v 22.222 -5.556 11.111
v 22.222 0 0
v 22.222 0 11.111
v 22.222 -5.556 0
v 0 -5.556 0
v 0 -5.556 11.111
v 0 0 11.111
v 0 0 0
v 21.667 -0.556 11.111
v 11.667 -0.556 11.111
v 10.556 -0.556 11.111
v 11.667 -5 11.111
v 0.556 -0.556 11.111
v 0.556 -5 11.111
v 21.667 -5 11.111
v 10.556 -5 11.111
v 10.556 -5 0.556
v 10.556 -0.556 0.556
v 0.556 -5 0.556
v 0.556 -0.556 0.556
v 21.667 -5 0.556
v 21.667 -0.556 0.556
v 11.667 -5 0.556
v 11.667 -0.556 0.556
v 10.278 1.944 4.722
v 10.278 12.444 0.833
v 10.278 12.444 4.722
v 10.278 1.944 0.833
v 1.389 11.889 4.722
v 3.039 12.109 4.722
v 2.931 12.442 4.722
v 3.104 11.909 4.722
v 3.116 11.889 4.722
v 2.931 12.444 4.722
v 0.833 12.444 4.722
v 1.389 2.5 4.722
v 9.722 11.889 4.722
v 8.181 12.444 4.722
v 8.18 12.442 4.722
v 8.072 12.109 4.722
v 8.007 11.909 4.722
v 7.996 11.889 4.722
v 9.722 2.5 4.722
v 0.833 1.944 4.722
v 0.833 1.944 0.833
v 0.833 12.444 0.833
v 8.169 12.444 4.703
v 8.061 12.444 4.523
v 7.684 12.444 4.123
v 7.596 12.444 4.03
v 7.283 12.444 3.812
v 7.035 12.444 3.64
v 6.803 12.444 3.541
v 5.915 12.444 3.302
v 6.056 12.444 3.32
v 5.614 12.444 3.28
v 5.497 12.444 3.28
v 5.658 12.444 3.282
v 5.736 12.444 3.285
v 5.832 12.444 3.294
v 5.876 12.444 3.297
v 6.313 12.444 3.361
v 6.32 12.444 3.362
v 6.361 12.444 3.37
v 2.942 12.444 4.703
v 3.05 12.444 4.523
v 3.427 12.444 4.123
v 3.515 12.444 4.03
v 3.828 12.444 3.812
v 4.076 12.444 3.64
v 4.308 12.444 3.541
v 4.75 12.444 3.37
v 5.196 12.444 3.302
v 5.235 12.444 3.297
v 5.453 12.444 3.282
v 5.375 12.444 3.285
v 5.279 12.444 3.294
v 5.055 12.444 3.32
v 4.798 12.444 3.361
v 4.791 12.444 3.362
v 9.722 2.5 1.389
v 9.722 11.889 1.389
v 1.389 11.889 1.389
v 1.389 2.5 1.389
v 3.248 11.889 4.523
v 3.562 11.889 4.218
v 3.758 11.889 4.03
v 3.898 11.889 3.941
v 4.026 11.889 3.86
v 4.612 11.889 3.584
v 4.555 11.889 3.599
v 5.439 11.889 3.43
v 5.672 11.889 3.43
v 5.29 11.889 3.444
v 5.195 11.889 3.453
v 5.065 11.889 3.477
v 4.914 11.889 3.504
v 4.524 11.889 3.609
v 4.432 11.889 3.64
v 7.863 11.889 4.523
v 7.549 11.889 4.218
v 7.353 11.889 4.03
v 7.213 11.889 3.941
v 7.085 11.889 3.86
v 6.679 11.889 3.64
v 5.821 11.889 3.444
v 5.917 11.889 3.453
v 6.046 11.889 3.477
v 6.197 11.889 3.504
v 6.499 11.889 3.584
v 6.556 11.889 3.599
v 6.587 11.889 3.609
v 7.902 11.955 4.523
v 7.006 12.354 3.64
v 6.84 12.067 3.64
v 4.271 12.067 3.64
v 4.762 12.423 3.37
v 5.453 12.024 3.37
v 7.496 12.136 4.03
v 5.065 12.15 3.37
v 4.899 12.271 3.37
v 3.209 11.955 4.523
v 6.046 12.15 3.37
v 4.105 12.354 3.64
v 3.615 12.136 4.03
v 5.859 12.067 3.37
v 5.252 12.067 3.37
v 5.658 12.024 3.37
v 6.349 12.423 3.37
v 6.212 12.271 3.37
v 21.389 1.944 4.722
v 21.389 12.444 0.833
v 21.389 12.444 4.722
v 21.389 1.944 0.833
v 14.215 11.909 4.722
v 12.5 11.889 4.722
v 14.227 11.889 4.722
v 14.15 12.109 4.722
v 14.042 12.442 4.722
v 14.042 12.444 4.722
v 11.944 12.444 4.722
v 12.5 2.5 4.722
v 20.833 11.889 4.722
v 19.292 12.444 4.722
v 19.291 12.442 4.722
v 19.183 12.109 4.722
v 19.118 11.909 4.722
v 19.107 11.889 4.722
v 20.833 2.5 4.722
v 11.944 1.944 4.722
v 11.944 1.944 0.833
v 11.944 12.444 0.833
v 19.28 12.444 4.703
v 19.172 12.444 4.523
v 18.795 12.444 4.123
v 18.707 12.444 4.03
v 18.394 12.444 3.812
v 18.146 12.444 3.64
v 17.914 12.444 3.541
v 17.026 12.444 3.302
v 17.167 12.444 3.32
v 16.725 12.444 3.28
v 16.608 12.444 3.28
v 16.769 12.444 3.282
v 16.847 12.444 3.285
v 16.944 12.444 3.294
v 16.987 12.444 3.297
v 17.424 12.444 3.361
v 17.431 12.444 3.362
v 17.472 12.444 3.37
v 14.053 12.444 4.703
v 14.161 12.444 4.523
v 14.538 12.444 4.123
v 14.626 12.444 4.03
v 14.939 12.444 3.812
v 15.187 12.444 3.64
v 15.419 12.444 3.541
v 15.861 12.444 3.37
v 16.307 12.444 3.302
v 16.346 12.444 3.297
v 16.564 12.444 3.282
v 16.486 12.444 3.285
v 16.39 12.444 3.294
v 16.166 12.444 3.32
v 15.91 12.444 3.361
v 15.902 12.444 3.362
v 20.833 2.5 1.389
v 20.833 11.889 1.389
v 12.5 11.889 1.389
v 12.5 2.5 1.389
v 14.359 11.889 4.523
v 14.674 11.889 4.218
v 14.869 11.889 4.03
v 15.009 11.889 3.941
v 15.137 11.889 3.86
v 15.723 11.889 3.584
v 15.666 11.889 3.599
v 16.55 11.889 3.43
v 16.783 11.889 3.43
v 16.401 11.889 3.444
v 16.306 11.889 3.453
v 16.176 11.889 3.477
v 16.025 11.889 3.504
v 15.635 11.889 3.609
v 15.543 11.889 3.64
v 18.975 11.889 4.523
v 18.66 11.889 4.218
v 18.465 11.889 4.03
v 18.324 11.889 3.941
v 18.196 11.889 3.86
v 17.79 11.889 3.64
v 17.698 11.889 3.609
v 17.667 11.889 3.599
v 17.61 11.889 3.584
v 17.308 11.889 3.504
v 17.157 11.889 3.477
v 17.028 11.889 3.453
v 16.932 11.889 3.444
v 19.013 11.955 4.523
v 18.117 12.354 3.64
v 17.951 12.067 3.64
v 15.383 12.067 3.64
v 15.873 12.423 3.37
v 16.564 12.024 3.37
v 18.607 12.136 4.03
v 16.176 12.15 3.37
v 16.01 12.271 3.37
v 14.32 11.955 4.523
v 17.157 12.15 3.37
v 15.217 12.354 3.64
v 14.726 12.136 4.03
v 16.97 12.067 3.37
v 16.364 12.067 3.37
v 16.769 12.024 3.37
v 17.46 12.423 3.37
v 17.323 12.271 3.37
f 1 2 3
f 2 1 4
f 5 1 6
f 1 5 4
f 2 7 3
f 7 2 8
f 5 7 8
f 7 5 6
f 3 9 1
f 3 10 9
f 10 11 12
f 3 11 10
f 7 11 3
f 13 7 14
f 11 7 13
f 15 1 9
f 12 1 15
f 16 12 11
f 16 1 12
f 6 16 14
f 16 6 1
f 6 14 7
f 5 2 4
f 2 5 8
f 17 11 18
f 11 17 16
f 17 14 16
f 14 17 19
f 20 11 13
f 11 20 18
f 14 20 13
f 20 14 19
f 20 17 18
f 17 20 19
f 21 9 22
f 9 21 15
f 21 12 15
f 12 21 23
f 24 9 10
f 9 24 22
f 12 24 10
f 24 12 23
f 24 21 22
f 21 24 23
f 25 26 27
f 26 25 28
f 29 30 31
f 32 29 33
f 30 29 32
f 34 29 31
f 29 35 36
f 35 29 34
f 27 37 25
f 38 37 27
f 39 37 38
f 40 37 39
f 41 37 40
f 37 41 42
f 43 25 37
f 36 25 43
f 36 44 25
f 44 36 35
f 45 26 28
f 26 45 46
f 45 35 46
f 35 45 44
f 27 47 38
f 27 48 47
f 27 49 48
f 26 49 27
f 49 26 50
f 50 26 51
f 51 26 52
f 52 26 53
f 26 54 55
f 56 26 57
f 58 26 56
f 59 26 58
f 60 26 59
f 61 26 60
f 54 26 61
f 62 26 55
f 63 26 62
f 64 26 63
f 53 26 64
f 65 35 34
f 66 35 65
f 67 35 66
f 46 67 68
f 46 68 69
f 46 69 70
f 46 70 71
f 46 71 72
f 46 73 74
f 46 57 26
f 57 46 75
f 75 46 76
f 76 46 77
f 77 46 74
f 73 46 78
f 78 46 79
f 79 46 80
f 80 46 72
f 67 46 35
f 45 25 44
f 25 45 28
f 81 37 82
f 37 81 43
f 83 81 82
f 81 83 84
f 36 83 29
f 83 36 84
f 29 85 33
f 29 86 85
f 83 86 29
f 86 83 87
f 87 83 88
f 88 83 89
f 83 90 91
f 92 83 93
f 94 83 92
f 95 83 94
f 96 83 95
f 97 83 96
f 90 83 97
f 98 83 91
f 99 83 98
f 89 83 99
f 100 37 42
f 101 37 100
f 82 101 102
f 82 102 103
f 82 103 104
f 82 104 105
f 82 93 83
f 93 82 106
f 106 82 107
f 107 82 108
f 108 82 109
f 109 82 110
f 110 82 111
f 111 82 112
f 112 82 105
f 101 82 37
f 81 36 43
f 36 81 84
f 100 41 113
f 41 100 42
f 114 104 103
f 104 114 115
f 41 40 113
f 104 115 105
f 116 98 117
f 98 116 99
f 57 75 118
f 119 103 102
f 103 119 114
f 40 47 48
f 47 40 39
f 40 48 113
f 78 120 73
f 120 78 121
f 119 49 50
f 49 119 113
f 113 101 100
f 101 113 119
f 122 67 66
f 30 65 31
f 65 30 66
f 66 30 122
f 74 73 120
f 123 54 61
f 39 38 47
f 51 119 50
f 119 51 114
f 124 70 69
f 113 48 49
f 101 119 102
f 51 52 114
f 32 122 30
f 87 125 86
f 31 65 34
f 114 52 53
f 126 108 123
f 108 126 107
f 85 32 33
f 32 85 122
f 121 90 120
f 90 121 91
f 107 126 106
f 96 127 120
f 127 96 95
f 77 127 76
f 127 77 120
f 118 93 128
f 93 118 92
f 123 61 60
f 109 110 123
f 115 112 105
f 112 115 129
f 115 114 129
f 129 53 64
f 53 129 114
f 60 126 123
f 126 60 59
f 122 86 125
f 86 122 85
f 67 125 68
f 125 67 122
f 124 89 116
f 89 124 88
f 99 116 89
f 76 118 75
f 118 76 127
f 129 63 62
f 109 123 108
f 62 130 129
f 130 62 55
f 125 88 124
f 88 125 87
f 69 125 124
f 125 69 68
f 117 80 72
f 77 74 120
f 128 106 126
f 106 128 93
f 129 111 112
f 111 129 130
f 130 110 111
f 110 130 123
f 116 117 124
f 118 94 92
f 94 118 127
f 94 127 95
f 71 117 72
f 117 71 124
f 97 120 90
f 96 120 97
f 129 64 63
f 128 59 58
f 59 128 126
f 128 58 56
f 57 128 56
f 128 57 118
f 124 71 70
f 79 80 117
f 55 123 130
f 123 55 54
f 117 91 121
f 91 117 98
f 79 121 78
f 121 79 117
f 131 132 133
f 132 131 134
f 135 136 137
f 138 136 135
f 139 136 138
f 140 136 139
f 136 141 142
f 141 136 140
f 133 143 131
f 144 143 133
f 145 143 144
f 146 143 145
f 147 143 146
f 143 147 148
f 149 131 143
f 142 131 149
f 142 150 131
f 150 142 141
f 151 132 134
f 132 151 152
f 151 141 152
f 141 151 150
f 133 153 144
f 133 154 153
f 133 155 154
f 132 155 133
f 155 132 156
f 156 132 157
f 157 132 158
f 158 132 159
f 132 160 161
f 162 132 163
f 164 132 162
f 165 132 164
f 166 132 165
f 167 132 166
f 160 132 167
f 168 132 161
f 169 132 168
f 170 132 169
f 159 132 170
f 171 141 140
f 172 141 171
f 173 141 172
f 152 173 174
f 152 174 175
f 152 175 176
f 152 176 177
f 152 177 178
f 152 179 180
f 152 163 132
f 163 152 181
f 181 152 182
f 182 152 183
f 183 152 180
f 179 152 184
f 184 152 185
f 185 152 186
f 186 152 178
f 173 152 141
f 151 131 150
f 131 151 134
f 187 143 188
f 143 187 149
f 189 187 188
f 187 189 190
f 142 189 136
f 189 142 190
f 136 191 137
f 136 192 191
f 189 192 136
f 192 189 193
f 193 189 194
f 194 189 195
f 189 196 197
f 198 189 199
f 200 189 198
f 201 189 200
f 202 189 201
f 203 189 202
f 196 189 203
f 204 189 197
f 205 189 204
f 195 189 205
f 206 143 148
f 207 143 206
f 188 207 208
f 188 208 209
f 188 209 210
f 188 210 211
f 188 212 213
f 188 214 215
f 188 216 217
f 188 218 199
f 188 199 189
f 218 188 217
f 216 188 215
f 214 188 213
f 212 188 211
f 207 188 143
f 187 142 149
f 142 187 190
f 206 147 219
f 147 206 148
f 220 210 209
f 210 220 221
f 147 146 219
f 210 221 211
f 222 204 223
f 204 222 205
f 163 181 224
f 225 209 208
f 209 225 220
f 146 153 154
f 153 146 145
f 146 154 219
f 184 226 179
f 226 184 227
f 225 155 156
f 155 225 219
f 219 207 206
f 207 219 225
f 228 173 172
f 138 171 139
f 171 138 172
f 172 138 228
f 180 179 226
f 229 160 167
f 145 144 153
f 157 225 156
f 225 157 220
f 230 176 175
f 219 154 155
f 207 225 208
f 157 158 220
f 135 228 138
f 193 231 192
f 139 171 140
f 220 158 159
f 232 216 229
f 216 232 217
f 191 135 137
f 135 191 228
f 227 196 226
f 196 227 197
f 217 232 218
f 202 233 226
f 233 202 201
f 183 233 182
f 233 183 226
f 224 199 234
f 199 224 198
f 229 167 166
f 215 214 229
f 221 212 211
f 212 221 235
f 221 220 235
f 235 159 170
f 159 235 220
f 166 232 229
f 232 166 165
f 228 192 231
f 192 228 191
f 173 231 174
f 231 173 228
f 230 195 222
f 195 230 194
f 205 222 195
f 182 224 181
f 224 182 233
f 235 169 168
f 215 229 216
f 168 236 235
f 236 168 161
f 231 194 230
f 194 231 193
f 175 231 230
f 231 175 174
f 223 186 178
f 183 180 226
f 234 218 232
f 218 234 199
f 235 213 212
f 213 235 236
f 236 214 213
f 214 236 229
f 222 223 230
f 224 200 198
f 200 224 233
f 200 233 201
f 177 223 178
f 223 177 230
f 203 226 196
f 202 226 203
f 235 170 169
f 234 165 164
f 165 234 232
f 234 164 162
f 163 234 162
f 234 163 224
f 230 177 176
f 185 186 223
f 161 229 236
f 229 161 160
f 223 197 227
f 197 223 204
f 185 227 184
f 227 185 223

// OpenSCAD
dim=[80, 40, 20];

width = dim[0];
depth = dim[1];
height = dim[2];

wall = 2;
drawer_width = dim[0] / 2 - 2.*wall;

s=3.6;
slop = 2;
drawer_offset = 5;
wall = 2;
drawer_width = dim[0] / 2 - 2.*wall;

scale([1/s, 1/s, 1/s])
    organizer();

module organizer() {

    function add_const(vec, val) =
        [for (v = vec) val + v];

    to_left_drawer = add_const(
        [slop/2, drawer_offset, slop/2],
        wall
    );

    to_right_drawer = add_const(
        [width / 2 + slop / 2, drawer_offset, slop / 2],
        wall
    );

    rotate([90, 0, 0])
        organizer_body();

    translate(to_left_drawer)
        organizer_drawer(inner_wall=wall, slop=slop);

    translate(to_right_drawer)
        organizer_drawer(inner_wall=wall, slop=slop);
}

module organizer_body() {

difference() {
    cube([width, depth, height]);

    drawer_cutout = [
        drawer_width,
        2+depth - wall,
        height - 2*wall
    ];

    translate([wall, wall, wall])
        cube(drawer_cutout);
    translate([width / 2 + wall, wall, wall])
        cube(drawer_cutout);
}

}

module organizer_drawer(inner_wall, slop) {

difference(){
    cube([drawer_width-slop, depth-wall-slop/10, height-2*wall-slop]);

    translate([inner_wall, inner_wall, inner_wall])
        cube([
            drawer_width-2*inner_wall-slop,
            depth-wall-2*inner_wall-slop/10,
            height-2*wall
        ]);

    translate([(drawer_width-slop) / 2, depth-slop/10, height])
        sphere(d=width/3.5);
}
}
